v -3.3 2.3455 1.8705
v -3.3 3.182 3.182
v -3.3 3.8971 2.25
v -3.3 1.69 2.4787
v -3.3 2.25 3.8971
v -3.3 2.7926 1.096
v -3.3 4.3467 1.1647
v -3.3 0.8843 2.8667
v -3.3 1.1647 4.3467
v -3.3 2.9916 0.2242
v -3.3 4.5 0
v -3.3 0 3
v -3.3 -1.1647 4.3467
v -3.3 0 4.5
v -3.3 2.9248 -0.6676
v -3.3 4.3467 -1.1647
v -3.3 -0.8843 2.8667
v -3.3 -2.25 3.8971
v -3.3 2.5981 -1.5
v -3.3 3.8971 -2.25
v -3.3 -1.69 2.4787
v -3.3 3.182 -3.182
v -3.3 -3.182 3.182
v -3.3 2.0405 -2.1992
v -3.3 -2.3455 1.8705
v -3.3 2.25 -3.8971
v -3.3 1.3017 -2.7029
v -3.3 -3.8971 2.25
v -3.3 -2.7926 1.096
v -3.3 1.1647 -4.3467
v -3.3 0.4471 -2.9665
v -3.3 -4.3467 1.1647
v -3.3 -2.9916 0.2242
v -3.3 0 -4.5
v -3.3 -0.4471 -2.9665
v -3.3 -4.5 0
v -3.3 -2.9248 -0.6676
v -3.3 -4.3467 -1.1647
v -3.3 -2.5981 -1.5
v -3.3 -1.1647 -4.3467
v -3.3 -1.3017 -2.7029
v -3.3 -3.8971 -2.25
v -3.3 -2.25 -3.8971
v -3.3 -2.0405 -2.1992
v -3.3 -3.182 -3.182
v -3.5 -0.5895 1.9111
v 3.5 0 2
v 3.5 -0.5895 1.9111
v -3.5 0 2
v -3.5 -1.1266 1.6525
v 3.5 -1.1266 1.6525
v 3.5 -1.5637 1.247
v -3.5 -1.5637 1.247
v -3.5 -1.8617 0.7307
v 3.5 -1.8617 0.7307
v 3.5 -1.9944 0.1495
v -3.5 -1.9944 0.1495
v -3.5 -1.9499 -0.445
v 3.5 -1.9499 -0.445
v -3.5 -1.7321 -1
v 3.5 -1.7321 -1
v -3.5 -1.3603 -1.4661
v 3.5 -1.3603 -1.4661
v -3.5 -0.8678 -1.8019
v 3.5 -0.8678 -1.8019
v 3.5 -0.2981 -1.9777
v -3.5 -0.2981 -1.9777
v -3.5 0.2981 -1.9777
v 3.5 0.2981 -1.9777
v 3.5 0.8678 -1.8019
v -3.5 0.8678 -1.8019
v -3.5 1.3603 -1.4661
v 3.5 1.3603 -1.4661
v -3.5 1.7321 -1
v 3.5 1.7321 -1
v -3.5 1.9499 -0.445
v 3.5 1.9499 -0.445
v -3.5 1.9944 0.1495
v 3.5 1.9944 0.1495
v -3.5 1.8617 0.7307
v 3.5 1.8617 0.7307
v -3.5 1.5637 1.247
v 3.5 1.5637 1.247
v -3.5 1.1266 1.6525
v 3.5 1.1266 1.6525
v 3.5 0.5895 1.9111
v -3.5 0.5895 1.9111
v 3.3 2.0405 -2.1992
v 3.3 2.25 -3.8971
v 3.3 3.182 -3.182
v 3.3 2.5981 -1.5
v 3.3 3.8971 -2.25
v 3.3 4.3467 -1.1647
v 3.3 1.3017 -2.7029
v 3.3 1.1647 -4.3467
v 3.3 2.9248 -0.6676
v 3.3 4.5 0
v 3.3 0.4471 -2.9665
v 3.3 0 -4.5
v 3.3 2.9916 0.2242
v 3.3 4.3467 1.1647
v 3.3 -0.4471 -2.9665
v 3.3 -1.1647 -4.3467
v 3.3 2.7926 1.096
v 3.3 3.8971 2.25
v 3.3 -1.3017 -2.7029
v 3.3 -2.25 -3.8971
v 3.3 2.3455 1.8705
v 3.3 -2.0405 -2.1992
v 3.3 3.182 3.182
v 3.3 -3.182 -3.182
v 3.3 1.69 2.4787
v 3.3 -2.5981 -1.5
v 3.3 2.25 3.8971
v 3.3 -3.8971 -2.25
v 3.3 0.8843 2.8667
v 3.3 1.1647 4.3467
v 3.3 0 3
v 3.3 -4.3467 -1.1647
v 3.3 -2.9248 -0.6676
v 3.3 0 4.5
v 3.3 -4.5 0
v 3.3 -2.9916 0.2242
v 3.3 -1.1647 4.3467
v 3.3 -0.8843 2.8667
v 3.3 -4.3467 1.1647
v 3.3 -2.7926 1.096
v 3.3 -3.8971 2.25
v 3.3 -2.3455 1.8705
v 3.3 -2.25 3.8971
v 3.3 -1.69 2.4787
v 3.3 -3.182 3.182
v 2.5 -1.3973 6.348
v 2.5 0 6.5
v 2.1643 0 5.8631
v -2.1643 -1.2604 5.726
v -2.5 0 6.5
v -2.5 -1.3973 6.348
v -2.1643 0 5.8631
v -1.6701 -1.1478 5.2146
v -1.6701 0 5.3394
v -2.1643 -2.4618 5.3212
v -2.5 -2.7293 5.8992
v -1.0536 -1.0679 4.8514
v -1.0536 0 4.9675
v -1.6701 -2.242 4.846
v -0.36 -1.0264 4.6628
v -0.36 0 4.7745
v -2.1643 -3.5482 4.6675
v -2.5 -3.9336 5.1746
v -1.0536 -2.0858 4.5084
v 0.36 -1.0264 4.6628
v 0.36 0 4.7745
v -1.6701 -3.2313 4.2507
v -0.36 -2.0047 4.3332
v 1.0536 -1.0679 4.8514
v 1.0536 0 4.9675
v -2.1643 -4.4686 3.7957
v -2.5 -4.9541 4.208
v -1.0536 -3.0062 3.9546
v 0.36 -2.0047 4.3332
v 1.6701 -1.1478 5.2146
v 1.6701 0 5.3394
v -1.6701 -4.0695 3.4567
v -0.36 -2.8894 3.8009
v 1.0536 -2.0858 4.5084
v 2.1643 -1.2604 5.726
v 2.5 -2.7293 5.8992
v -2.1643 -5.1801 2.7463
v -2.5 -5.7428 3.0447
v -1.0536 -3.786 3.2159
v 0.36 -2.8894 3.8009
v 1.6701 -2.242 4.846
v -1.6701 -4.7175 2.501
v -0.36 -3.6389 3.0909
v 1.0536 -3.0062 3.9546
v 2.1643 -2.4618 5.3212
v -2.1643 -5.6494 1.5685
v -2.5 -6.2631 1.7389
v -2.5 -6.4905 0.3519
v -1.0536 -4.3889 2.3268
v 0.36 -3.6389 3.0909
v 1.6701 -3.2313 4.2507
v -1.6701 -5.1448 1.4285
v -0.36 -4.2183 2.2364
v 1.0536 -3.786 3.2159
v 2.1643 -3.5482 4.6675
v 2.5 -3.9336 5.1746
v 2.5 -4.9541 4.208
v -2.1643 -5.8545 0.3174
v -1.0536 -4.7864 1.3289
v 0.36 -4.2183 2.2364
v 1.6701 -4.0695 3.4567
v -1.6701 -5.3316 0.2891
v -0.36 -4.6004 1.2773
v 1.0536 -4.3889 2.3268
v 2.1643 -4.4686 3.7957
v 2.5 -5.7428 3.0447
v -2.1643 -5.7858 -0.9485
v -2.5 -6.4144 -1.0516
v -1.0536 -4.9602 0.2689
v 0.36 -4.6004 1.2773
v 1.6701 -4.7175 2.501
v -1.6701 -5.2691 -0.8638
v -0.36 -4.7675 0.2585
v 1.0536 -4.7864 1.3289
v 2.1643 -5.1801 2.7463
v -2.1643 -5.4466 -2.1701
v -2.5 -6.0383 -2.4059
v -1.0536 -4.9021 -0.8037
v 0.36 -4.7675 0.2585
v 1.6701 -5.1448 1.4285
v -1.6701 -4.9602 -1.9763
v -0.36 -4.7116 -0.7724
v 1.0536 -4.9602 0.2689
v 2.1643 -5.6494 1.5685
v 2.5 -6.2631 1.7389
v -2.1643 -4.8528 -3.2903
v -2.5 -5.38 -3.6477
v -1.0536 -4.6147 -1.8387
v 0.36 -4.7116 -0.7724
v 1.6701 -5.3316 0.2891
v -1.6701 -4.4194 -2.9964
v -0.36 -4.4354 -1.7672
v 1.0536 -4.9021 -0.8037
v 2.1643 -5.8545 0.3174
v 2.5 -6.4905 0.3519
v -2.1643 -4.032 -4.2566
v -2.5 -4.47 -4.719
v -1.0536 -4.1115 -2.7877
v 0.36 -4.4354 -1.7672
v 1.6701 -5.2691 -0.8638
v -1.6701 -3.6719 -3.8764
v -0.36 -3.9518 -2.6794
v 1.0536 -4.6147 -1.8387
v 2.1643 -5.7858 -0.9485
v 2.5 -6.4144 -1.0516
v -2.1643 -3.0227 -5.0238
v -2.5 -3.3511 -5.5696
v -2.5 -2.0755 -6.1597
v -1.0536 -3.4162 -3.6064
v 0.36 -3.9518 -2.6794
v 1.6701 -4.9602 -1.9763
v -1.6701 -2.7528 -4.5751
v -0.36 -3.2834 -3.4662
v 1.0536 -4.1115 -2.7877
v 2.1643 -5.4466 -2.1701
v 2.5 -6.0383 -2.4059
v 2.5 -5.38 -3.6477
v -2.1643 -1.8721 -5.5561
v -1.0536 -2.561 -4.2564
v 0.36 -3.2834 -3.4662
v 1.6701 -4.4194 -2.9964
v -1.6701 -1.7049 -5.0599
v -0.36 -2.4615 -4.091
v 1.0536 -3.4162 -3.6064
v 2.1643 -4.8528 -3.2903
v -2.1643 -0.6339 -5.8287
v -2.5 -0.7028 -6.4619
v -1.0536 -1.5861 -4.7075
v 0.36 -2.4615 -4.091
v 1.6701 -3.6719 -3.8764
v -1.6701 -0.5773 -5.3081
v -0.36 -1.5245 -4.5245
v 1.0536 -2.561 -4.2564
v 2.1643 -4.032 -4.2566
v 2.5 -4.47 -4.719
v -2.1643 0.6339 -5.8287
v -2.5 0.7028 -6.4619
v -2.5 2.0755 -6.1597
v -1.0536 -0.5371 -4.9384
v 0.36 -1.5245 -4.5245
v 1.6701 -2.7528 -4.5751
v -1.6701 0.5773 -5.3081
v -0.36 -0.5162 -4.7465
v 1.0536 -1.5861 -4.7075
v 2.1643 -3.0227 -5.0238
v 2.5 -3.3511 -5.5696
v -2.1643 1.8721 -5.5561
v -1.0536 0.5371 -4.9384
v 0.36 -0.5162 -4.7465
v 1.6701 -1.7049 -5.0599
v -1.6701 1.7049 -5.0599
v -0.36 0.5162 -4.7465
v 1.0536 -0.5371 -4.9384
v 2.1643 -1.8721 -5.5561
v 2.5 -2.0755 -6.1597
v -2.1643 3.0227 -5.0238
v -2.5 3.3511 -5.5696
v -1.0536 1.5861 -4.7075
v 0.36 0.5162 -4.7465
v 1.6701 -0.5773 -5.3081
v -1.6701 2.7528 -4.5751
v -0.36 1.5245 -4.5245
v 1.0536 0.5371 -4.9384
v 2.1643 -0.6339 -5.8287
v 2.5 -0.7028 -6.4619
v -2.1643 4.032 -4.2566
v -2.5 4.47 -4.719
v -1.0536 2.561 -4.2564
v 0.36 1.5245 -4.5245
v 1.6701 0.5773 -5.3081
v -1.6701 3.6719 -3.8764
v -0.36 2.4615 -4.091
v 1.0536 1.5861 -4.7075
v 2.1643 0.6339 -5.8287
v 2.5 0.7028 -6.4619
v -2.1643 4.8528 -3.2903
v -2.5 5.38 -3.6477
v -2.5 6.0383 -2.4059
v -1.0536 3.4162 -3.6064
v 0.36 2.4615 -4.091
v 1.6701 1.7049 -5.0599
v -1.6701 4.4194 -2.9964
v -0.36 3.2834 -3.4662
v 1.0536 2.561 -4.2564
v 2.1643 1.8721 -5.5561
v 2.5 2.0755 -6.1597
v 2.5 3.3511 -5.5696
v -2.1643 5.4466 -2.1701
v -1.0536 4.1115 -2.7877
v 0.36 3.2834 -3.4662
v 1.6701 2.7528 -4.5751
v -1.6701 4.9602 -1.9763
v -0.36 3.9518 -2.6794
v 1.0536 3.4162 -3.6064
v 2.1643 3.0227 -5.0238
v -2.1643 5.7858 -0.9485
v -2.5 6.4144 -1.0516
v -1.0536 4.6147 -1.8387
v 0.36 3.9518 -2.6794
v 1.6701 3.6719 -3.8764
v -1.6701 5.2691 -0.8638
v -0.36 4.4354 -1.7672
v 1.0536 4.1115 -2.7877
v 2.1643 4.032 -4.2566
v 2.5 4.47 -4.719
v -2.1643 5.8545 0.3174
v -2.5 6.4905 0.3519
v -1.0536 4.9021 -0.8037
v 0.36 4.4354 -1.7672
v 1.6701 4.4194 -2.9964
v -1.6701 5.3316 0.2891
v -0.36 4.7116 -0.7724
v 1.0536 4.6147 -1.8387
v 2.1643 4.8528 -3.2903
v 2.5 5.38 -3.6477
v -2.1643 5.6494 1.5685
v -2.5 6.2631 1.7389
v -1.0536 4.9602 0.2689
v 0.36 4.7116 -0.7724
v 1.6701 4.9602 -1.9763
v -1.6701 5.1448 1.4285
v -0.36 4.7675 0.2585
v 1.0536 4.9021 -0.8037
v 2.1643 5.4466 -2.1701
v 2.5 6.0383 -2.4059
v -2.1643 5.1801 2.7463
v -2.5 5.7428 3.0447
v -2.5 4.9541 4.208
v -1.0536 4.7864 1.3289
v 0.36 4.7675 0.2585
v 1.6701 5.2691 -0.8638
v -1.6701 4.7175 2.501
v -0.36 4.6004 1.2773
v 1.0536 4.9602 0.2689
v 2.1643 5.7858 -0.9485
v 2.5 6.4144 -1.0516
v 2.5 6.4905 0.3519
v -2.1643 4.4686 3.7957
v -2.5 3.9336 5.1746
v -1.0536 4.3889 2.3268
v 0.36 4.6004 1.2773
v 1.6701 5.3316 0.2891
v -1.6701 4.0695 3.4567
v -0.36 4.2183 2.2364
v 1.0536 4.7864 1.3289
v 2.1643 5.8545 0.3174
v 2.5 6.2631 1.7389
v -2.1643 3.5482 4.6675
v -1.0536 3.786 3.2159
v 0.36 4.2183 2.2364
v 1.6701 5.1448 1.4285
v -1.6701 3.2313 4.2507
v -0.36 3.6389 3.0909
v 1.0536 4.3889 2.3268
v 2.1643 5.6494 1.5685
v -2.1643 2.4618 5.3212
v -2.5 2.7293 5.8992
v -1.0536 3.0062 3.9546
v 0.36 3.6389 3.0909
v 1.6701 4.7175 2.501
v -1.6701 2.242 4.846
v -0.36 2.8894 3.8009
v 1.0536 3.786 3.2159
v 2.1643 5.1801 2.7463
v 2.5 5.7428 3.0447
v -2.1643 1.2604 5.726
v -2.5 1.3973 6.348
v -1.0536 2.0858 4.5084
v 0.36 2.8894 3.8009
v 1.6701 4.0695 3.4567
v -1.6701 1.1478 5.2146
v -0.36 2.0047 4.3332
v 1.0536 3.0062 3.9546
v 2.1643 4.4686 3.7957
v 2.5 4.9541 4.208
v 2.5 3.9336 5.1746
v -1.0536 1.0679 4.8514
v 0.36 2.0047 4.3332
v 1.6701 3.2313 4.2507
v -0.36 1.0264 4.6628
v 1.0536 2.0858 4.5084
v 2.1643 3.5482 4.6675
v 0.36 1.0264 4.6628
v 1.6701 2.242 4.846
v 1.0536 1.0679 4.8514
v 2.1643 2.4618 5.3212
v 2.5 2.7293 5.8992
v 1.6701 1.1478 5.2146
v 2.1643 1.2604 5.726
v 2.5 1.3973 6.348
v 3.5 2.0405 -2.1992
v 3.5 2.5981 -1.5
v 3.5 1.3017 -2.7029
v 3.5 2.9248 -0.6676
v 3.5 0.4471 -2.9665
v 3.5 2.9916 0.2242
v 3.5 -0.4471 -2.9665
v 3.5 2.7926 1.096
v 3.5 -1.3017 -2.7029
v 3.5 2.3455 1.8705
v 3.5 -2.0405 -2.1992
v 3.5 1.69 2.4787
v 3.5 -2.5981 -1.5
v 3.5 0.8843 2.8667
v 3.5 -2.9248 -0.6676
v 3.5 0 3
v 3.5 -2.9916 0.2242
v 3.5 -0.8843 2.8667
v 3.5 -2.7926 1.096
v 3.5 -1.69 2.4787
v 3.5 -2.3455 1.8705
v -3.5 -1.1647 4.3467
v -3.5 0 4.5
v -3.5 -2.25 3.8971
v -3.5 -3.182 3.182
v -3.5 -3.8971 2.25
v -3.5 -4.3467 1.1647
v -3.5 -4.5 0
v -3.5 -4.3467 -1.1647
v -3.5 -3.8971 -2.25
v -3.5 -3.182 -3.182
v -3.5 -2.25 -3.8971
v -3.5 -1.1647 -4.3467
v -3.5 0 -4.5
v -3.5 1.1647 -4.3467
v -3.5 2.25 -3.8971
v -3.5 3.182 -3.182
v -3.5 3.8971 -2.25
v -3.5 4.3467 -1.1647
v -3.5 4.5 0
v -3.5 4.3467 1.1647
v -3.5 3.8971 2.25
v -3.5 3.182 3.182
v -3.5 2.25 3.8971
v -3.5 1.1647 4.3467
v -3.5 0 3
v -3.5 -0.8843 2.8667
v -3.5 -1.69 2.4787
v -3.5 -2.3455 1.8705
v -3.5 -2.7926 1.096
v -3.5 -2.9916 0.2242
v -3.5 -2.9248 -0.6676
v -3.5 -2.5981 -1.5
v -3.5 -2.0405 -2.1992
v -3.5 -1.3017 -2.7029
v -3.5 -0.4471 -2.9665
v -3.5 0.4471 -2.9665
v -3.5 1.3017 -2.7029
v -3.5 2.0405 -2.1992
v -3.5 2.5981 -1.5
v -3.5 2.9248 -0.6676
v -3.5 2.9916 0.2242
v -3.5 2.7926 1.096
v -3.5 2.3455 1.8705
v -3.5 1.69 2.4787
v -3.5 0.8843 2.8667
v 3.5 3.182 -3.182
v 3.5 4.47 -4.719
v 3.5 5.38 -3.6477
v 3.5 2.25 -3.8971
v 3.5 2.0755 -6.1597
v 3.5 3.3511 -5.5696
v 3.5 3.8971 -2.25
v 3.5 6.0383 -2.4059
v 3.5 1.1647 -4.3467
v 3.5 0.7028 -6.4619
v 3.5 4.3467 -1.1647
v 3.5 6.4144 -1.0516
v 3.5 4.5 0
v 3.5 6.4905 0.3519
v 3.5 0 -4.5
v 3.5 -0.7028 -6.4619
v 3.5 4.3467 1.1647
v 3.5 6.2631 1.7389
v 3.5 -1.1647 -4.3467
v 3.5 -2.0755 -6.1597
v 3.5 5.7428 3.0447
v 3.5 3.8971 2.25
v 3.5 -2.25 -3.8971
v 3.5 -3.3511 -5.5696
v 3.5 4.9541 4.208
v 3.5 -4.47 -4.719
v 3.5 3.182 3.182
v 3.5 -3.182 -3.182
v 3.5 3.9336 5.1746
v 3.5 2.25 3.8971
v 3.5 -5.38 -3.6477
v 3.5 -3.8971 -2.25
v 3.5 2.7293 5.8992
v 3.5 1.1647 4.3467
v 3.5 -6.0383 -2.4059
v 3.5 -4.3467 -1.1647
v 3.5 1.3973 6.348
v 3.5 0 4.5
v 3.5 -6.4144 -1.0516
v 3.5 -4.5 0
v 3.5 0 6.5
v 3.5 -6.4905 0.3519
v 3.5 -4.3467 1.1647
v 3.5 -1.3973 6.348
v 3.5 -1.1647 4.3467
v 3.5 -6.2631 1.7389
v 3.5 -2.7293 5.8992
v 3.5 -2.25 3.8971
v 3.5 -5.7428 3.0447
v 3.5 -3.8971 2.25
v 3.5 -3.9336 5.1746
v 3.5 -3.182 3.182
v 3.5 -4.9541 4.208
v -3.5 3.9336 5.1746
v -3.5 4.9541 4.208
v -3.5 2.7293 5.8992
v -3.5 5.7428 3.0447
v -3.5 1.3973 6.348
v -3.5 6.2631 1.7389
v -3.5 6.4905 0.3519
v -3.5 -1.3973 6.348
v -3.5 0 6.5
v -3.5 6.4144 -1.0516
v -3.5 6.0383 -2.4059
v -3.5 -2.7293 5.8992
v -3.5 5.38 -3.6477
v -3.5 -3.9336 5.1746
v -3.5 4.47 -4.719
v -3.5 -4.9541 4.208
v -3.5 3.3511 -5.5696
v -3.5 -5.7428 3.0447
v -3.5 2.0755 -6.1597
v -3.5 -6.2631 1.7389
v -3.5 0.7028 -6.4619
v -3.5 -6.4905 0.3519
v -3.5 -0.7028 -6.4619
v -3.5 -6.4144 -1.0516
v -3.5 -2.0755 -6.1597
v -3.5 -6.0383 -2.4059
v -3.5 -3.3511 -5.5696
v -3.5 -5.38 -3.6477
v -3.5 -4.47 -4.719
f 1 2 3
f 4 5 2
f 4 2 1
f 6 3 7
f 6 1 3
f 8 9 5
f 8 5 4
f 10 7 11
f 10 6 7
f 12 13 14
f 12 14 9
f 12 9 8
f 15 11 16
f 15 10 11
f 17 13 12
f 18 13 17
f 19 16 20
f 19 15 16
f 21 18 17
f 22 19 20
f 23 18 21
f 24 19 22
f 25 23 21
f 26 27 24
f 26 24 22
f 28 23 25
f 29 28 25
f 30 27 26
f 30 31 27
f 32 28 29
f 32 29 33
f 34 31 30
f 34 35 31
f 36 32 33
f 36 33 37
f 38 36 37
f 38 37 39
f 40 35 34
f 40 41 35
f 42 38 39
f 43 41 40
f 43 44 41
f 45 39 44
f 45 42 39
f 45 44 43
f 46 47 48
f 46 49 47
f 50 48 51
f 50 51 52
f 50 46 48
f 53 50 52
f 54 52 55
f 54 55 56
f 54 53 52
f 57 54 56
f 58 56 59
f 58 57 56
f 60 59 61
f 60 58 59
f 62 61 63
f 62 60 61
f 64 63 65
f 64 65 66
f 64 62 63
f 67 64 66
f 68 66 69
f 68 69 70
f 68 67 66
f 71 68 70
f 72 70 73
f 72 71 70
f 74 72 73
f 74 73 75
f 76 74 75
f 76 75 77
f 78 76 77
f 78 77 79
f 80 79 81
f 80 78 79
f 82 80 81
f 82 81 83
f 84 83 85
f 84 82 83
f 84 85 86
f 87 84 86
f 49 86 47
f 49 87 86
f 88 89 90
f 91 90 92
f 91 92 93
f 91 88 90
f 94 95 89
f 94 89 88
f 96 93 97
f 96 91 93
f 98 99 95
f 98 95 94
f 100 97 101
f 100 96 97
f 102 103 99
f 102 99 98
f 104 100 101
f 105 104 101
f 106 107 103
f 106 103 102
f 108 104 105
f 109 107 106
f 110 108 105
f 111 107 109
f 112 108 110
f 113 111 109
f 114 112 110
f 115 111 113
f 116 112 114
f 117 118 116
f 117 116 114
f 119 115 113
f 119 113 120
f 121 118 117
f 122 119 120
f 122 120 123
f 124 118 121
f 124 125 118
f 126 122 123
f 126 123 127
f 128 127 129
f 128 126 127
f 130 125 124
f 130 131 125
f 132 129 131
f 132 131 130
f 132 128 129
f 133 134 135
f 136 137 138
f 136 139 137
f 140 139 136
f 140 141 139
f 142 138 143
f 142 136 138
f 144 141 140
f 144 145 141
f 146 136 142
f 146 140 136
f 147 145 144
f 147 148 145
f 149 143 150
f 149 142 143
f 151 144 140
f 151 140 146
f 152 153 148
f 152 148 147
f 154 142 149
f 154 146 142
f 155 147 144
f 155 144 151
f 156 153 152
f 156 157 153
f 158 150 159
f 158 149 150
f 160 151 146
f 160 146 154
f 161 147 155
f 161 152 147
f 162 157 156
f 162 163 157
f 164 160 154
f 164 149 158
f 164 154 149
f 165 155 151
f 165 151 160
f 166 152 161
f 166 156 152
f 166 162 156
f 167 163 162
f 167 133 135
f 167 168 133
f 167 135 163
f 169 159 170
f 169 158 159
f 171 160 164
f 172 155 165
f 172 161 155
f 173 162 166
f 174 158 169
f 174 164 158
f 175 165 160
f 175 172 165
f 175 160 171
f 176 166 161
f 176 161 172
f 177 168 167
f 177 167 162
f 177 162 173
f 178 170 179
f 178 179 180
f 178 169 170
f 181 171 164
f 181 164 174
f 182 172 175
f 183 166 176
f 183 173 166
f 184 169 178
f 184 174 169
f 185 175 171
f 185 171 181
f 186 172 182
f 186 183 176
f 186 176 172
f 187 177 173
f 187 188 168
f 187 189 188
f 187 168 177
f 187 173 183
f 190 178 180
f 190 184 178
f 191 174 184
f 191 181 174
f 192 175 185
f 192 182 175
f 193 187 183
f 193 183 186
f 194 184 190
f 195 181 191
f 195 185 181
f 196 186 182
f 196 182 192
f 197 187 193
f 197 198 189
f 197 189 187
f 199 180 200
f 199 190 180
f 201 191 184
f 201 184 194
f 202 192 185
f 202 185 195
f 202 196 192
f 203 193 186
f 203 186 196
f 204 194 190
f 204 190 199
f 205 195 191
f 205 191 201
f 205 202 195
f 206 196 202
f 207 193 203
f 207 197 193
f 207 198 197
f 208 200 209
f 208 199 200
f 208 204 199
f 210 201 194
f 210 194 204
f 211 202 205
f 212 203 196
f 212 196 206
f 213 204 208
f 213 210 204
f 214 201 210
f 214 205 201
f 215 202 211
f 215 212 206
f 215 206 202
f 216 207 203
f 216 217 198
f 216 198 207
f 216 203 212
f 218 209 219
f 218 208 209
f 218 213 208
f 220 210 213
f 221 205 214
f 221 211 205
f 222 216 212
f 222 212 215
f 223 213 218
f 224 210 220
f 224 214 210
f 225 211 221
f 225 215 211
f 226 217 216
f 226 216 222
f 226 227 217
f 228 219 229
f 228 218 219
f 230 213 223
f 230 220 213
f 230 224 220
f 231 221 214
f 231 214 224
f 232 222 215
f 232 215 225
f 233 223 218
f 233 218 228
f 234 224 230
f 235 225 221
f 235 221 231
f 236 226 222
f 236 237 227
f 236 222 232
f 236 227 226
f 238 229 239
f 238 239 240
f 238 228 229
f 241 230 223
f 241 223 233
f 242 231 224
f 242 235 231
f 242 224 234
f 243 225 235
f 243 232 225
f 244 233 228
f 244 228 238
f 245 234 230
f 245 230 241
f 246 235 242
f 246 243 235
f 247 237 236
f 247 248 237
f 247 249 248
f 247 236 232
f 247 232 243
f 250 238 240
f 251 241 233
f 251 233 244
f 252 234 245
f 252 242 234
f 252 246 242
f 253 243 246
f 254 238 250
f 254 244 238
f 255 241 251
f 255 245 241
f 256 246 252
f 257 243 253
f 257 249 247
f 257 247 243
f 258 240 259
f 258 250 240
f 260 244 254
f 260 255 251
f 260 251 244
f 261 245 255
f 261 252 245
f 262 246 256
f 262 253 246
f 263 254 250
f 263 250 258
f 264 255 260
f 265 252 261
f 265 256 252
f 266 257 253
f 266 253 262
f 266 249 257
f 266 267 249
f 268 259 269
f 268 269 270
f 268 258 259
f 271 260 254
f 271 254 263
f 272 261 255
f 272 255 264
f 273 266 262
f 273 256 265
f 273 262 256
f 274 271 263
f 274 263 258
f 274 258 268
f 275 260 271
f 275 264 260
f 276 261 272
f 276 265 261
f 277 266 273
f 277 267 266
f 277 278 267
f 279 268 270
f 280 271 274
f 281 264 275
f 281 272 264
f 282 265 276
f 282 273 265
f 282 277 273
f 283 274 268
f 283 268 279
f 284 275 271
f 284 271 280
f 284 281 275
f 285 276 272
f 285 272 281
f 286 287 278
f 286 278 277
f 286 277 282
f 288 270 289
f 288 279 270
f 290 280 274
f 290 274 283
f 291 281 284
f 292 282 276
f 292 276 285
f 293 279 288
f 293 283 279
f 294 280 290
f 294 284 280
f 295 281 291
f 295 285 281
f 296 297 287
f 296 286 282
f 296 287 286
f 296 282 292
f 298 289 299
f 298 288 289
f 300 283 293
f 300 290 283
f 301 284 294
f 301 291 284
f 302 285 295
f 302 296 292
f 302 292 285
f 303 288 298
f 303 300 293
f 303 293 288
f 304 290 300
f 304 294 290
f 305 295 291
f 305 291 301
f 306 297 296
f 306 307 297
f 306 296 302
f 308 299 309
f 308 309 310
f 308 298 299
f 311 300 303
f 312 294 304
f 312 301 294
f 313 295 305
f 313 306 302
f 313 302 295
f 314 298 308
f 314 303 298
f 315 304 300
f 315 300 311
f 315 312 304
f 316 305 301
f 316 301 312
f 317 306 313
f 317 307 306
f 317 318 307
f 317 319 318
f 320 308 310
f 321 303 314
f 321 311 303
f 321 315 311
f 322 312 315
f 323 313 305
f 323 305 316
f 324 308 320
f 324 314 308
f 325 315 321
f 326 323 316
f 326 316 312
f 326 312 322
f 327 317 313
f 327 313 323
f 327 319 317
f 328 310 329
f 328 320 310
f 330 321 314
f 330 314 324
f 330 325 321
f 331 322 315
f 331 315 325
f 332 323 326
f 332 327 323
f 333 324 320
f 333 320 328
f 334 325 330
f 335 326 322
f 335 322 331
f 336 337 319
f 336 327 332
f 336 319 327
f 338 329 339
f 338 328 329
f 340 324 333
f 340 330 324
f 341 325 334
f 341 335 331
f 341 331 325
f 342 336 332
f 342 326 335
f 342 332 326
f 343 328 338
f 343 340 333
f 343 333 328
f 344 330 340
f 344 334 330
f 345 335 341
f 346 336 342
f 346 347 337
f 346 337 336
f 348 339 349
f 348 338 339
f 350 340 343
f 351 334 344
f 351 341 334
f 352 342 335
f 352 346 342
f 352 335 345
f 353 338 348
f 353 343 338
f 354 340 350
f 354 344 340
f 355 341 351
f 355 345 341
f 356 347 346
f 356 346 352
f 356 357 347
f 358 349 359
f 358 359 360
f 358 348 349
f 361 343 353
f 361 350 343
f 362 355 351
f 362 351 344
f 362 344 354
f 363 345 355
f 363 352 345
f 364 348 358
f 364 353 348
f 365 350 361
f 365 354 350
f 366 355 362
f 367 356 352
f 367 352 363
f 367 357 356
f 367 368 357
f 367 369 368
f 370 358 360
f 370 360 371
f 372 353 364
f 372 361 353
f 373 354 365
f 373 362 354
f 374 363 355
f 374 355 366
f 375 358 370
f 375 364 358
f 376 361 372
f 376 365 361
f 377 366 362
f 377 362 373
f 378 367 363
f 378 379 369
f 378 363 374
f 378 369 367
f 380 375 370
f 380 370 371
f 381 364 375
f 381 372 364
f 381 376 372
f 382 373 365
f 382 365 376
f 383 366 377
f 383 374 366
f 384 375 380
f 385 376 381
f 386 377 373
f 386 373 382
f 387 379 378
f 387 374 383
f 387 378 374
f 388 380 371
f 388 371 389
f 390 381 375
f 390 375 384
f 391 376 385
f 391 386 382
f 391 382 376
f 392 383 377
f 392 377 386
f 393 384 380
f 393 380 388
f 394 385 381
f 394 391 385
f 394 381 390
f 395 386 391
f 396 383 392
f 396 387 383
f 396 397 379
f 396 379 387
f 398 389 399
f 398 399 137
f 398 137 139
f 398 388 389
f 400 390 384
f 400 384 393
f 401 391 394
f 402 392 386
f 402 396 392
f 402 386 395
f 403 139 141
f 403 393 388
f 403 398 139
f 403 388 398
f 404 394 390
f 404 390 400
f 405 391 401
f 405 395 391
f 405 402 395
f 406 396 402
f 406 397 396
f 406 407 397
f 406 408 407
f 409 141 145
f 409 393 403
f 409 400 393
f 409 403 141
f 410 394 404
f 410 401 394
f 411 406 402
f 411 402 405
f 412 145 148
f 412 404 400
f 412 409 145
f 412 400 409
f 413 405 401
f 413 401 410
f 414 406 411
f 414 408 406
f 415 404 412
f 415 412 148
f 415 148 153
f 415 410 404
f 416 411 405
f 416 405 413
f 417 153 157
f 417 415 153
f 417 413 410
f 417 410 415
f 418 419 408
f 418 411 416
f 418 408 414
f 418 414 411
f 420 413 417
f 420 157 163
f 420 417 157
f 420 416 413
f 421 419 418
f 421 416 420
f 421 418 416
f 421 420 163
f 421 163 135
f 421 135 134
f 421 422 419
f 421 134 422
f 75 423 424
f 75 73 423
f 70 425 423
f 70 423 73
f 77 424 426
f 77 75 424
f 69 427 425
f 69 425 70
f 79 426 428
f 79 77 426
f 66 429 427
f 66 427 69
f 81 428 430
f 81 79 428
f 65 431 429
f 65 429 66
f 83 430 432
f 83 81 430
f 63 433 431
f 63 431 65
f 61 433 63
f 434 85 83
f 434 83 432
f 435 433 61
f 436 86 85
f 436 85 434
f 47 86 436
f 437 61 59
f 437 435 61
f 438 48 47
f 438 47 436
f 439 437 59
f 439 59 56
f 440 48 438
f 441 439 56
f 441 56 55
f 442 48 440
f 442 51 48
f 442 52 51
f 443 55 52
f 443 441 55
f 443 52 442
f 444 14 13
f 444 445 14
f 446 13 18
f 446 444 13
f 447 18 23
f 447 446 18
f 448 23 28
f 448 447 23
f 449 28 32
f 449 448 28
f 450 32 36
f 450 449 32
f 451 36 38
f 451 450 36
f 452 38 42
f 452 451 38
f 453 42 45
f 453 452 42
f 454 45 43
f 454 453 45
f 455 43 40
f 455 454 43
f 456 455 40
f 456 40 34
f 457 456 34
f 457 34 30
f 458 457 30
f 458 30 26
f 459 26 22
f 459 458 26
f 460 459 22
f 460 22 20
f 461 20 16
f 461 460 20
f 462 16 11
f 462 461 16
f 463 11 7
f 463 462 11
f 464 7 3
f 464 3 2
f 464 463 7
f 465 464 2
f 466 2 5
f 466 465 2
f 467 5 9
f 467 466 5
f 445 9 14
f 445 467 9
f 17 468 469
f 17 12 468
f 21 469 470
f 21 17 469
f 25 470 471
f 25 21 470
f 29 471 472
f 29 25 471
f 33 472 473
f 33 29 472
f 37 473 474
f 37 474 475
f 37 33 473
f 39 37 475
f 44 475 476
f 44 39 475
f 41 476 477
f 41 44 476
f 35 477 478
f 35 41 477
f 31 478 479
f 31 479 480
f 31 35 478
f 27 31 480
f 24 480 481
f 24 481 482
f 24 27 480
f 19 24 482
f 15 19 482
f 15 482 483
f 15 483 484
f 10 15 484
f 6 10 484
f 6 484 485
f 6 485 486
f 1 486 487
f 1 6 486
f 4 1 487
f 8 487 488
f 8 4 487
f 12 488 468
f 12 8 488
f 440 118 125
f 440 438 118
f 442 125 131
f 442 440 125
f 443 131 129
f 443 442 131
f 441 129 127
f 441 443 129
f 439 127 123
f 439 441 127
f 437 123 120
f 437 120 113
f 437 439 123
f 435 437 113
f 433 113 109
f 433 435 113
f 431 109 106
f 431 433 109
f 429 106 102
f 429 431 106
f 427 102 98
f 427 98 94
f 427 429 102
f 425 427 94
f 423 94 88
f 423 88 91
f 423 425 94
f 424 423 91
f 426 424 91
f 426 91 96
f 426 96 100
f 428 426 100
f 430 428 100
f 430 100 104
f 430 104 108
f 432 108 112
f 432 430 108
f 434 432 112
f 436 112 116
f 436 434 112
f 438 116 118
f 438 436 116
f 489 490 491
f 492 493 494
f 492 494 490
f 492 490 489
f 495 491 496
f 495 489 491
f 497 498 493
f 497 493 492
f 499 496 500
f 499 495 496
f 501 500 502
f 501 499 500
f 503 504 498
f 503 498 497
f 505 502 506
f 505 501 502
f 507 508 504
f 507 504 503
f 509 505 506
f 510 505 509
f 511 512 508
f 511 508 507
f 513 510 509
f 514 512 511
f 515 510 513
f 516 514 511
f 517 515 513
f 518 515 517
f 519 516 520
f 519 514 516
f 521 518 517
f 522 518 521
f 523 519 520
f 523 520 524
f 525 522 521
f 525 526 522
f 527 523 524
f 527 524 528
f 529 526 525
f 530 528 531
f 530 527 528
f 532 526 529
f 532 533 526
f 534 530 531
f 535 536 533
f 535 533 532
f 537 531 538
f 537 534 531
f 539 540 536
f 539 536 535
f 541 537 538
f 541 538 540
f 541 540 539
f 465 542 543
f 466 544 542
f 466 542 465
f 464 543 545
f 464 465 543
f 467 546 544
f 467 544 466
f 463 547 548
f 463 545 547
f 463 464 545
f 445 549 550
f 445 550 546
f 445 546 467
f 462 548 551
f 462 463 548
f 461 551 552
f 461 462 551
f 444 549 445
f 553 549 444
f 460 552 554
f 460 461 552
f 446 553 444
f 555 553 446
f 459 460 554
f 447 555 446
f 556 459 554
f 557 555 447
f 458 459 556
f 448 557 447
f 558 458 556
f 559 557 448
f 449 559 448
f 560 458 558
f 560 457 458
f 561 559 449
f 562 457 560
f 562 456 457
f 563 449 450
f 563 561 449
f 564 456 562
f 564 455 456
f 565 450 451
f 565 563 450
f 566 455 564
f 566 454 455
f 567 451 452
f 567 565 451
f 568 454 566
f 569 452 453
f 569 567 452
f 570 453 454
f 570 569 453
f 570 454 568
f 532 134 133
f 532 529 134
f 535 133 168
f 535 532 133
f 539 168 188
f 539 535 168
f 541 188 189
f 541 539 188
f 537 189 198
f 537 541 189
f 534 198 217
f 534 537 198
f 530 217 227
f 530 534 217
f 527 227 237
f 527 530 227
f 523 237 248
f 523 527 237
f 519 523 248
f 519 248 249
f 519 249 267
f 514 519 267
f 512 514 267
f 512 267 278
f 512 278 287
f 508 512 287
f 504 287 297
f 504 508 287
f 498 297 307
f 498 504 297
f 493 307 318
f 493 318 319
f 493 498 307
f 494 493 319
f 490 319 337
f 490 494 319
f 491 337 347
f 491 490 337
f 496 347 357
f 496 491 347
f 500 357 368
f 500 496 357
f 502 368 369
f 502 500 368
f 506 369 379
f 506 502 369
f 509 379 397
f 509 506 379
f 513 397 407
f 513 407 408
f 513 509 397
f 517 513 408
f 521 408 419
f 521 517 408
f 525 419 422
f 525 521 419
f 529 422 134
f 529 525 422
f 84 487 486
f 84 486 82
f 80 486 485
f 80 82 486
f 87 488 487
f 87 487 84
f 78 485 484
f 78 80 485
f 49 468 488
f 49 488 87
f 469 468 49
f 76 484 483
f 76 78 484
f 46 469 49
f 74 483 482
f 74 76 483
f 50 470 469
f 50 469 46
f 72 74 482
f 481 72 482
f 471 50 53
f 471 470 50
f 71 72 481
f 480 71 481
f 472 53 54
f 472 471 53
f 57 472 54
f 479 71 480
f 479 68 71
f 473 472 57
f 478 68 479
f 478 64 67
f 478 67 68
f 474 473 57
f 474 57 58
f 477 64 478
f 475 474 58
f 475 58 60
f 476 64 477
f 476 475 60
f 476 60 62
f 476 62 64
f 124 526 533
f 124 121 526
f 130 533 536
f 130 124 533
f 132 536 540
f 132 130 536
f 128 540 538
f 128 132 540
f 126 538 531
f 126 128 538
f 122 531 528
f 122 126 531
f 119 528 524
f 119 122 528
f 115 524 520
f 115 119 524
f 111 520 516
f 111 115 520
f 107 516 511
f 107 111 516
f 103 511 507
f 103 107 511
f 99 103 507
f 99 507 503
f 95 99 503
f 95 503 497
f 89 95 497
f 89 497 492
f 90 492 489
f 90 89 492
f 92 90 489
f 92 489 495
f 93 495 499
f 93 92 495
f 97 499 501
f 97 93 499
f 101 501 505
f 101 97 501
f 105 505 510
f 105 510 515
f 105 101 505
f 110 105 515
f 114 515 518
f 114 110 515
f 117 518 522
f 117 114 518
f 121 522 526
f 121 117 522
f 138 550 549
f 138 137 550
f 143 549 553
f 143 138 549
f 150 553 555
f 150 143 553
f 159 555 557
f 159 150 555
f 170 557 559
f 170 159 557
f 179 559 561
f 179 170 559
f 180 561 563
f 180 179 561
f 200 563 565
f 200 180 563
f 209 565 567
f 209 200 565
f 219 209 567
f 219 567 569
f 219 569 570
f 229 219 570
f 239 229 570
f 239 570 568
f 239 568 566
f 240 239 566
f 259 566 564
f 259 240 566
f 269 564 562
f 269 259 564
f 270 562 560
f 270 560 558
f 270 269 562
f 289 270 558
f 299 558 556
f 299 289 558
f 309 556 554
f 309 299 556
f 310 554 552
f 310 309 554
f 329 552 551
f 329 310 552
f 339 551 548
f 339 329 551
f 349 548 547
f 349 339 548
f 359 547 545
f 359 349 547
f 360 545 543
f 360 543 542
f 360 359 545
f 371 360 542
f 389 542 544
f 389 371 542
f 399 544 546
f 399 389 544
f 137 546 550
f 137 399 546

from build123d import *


with BuildPart() as part:
    # Esquisse1 → Révolution1 (revolve)
    with BuildSketch(Plane.XY, mode=Mode.PRIVATE) as r_volution1_sk:
        with BuildLine():
            Line((-3.5, 3), (-3.3, 3))
            Line((-3.3, 3), (-3.3, 4.5))
            Line((-3.3, 4.5), (-3.5, 4.5))
            Line((-3.5, 4.5), (-3.5, 6.5))
            Line((-3.5, 6.5), (-2.5, 6.5))
            ThreePointArc((-2.5, 6.5), (0, 4.75), (2.5, 6.5))
            Line((2.5, 6.5), (3.5, 6.5))
            Line((3.5, 6.5), (3.5, 4.5))
            Line((3.5, 4.5), (3.3, 4.5))
            Line((3.3, 4.5), (3.3, 3))
            Line((3.3, 3), (3.5, 3))
            Line((3.5, 3), (3.5, 2))
            Line((3.5, 2), (-3.5, 2))
            Line((-3.5, 2), (-3.5, 3))
        make_face()
    revolve(r_volution1_sk.sketch.rotate(Axis((-3.5, 0, 0), (1, 0, 0)), 90), axis=Axis((-3.5, 0, 0), (1, 0, 0)))


solid = part.part
